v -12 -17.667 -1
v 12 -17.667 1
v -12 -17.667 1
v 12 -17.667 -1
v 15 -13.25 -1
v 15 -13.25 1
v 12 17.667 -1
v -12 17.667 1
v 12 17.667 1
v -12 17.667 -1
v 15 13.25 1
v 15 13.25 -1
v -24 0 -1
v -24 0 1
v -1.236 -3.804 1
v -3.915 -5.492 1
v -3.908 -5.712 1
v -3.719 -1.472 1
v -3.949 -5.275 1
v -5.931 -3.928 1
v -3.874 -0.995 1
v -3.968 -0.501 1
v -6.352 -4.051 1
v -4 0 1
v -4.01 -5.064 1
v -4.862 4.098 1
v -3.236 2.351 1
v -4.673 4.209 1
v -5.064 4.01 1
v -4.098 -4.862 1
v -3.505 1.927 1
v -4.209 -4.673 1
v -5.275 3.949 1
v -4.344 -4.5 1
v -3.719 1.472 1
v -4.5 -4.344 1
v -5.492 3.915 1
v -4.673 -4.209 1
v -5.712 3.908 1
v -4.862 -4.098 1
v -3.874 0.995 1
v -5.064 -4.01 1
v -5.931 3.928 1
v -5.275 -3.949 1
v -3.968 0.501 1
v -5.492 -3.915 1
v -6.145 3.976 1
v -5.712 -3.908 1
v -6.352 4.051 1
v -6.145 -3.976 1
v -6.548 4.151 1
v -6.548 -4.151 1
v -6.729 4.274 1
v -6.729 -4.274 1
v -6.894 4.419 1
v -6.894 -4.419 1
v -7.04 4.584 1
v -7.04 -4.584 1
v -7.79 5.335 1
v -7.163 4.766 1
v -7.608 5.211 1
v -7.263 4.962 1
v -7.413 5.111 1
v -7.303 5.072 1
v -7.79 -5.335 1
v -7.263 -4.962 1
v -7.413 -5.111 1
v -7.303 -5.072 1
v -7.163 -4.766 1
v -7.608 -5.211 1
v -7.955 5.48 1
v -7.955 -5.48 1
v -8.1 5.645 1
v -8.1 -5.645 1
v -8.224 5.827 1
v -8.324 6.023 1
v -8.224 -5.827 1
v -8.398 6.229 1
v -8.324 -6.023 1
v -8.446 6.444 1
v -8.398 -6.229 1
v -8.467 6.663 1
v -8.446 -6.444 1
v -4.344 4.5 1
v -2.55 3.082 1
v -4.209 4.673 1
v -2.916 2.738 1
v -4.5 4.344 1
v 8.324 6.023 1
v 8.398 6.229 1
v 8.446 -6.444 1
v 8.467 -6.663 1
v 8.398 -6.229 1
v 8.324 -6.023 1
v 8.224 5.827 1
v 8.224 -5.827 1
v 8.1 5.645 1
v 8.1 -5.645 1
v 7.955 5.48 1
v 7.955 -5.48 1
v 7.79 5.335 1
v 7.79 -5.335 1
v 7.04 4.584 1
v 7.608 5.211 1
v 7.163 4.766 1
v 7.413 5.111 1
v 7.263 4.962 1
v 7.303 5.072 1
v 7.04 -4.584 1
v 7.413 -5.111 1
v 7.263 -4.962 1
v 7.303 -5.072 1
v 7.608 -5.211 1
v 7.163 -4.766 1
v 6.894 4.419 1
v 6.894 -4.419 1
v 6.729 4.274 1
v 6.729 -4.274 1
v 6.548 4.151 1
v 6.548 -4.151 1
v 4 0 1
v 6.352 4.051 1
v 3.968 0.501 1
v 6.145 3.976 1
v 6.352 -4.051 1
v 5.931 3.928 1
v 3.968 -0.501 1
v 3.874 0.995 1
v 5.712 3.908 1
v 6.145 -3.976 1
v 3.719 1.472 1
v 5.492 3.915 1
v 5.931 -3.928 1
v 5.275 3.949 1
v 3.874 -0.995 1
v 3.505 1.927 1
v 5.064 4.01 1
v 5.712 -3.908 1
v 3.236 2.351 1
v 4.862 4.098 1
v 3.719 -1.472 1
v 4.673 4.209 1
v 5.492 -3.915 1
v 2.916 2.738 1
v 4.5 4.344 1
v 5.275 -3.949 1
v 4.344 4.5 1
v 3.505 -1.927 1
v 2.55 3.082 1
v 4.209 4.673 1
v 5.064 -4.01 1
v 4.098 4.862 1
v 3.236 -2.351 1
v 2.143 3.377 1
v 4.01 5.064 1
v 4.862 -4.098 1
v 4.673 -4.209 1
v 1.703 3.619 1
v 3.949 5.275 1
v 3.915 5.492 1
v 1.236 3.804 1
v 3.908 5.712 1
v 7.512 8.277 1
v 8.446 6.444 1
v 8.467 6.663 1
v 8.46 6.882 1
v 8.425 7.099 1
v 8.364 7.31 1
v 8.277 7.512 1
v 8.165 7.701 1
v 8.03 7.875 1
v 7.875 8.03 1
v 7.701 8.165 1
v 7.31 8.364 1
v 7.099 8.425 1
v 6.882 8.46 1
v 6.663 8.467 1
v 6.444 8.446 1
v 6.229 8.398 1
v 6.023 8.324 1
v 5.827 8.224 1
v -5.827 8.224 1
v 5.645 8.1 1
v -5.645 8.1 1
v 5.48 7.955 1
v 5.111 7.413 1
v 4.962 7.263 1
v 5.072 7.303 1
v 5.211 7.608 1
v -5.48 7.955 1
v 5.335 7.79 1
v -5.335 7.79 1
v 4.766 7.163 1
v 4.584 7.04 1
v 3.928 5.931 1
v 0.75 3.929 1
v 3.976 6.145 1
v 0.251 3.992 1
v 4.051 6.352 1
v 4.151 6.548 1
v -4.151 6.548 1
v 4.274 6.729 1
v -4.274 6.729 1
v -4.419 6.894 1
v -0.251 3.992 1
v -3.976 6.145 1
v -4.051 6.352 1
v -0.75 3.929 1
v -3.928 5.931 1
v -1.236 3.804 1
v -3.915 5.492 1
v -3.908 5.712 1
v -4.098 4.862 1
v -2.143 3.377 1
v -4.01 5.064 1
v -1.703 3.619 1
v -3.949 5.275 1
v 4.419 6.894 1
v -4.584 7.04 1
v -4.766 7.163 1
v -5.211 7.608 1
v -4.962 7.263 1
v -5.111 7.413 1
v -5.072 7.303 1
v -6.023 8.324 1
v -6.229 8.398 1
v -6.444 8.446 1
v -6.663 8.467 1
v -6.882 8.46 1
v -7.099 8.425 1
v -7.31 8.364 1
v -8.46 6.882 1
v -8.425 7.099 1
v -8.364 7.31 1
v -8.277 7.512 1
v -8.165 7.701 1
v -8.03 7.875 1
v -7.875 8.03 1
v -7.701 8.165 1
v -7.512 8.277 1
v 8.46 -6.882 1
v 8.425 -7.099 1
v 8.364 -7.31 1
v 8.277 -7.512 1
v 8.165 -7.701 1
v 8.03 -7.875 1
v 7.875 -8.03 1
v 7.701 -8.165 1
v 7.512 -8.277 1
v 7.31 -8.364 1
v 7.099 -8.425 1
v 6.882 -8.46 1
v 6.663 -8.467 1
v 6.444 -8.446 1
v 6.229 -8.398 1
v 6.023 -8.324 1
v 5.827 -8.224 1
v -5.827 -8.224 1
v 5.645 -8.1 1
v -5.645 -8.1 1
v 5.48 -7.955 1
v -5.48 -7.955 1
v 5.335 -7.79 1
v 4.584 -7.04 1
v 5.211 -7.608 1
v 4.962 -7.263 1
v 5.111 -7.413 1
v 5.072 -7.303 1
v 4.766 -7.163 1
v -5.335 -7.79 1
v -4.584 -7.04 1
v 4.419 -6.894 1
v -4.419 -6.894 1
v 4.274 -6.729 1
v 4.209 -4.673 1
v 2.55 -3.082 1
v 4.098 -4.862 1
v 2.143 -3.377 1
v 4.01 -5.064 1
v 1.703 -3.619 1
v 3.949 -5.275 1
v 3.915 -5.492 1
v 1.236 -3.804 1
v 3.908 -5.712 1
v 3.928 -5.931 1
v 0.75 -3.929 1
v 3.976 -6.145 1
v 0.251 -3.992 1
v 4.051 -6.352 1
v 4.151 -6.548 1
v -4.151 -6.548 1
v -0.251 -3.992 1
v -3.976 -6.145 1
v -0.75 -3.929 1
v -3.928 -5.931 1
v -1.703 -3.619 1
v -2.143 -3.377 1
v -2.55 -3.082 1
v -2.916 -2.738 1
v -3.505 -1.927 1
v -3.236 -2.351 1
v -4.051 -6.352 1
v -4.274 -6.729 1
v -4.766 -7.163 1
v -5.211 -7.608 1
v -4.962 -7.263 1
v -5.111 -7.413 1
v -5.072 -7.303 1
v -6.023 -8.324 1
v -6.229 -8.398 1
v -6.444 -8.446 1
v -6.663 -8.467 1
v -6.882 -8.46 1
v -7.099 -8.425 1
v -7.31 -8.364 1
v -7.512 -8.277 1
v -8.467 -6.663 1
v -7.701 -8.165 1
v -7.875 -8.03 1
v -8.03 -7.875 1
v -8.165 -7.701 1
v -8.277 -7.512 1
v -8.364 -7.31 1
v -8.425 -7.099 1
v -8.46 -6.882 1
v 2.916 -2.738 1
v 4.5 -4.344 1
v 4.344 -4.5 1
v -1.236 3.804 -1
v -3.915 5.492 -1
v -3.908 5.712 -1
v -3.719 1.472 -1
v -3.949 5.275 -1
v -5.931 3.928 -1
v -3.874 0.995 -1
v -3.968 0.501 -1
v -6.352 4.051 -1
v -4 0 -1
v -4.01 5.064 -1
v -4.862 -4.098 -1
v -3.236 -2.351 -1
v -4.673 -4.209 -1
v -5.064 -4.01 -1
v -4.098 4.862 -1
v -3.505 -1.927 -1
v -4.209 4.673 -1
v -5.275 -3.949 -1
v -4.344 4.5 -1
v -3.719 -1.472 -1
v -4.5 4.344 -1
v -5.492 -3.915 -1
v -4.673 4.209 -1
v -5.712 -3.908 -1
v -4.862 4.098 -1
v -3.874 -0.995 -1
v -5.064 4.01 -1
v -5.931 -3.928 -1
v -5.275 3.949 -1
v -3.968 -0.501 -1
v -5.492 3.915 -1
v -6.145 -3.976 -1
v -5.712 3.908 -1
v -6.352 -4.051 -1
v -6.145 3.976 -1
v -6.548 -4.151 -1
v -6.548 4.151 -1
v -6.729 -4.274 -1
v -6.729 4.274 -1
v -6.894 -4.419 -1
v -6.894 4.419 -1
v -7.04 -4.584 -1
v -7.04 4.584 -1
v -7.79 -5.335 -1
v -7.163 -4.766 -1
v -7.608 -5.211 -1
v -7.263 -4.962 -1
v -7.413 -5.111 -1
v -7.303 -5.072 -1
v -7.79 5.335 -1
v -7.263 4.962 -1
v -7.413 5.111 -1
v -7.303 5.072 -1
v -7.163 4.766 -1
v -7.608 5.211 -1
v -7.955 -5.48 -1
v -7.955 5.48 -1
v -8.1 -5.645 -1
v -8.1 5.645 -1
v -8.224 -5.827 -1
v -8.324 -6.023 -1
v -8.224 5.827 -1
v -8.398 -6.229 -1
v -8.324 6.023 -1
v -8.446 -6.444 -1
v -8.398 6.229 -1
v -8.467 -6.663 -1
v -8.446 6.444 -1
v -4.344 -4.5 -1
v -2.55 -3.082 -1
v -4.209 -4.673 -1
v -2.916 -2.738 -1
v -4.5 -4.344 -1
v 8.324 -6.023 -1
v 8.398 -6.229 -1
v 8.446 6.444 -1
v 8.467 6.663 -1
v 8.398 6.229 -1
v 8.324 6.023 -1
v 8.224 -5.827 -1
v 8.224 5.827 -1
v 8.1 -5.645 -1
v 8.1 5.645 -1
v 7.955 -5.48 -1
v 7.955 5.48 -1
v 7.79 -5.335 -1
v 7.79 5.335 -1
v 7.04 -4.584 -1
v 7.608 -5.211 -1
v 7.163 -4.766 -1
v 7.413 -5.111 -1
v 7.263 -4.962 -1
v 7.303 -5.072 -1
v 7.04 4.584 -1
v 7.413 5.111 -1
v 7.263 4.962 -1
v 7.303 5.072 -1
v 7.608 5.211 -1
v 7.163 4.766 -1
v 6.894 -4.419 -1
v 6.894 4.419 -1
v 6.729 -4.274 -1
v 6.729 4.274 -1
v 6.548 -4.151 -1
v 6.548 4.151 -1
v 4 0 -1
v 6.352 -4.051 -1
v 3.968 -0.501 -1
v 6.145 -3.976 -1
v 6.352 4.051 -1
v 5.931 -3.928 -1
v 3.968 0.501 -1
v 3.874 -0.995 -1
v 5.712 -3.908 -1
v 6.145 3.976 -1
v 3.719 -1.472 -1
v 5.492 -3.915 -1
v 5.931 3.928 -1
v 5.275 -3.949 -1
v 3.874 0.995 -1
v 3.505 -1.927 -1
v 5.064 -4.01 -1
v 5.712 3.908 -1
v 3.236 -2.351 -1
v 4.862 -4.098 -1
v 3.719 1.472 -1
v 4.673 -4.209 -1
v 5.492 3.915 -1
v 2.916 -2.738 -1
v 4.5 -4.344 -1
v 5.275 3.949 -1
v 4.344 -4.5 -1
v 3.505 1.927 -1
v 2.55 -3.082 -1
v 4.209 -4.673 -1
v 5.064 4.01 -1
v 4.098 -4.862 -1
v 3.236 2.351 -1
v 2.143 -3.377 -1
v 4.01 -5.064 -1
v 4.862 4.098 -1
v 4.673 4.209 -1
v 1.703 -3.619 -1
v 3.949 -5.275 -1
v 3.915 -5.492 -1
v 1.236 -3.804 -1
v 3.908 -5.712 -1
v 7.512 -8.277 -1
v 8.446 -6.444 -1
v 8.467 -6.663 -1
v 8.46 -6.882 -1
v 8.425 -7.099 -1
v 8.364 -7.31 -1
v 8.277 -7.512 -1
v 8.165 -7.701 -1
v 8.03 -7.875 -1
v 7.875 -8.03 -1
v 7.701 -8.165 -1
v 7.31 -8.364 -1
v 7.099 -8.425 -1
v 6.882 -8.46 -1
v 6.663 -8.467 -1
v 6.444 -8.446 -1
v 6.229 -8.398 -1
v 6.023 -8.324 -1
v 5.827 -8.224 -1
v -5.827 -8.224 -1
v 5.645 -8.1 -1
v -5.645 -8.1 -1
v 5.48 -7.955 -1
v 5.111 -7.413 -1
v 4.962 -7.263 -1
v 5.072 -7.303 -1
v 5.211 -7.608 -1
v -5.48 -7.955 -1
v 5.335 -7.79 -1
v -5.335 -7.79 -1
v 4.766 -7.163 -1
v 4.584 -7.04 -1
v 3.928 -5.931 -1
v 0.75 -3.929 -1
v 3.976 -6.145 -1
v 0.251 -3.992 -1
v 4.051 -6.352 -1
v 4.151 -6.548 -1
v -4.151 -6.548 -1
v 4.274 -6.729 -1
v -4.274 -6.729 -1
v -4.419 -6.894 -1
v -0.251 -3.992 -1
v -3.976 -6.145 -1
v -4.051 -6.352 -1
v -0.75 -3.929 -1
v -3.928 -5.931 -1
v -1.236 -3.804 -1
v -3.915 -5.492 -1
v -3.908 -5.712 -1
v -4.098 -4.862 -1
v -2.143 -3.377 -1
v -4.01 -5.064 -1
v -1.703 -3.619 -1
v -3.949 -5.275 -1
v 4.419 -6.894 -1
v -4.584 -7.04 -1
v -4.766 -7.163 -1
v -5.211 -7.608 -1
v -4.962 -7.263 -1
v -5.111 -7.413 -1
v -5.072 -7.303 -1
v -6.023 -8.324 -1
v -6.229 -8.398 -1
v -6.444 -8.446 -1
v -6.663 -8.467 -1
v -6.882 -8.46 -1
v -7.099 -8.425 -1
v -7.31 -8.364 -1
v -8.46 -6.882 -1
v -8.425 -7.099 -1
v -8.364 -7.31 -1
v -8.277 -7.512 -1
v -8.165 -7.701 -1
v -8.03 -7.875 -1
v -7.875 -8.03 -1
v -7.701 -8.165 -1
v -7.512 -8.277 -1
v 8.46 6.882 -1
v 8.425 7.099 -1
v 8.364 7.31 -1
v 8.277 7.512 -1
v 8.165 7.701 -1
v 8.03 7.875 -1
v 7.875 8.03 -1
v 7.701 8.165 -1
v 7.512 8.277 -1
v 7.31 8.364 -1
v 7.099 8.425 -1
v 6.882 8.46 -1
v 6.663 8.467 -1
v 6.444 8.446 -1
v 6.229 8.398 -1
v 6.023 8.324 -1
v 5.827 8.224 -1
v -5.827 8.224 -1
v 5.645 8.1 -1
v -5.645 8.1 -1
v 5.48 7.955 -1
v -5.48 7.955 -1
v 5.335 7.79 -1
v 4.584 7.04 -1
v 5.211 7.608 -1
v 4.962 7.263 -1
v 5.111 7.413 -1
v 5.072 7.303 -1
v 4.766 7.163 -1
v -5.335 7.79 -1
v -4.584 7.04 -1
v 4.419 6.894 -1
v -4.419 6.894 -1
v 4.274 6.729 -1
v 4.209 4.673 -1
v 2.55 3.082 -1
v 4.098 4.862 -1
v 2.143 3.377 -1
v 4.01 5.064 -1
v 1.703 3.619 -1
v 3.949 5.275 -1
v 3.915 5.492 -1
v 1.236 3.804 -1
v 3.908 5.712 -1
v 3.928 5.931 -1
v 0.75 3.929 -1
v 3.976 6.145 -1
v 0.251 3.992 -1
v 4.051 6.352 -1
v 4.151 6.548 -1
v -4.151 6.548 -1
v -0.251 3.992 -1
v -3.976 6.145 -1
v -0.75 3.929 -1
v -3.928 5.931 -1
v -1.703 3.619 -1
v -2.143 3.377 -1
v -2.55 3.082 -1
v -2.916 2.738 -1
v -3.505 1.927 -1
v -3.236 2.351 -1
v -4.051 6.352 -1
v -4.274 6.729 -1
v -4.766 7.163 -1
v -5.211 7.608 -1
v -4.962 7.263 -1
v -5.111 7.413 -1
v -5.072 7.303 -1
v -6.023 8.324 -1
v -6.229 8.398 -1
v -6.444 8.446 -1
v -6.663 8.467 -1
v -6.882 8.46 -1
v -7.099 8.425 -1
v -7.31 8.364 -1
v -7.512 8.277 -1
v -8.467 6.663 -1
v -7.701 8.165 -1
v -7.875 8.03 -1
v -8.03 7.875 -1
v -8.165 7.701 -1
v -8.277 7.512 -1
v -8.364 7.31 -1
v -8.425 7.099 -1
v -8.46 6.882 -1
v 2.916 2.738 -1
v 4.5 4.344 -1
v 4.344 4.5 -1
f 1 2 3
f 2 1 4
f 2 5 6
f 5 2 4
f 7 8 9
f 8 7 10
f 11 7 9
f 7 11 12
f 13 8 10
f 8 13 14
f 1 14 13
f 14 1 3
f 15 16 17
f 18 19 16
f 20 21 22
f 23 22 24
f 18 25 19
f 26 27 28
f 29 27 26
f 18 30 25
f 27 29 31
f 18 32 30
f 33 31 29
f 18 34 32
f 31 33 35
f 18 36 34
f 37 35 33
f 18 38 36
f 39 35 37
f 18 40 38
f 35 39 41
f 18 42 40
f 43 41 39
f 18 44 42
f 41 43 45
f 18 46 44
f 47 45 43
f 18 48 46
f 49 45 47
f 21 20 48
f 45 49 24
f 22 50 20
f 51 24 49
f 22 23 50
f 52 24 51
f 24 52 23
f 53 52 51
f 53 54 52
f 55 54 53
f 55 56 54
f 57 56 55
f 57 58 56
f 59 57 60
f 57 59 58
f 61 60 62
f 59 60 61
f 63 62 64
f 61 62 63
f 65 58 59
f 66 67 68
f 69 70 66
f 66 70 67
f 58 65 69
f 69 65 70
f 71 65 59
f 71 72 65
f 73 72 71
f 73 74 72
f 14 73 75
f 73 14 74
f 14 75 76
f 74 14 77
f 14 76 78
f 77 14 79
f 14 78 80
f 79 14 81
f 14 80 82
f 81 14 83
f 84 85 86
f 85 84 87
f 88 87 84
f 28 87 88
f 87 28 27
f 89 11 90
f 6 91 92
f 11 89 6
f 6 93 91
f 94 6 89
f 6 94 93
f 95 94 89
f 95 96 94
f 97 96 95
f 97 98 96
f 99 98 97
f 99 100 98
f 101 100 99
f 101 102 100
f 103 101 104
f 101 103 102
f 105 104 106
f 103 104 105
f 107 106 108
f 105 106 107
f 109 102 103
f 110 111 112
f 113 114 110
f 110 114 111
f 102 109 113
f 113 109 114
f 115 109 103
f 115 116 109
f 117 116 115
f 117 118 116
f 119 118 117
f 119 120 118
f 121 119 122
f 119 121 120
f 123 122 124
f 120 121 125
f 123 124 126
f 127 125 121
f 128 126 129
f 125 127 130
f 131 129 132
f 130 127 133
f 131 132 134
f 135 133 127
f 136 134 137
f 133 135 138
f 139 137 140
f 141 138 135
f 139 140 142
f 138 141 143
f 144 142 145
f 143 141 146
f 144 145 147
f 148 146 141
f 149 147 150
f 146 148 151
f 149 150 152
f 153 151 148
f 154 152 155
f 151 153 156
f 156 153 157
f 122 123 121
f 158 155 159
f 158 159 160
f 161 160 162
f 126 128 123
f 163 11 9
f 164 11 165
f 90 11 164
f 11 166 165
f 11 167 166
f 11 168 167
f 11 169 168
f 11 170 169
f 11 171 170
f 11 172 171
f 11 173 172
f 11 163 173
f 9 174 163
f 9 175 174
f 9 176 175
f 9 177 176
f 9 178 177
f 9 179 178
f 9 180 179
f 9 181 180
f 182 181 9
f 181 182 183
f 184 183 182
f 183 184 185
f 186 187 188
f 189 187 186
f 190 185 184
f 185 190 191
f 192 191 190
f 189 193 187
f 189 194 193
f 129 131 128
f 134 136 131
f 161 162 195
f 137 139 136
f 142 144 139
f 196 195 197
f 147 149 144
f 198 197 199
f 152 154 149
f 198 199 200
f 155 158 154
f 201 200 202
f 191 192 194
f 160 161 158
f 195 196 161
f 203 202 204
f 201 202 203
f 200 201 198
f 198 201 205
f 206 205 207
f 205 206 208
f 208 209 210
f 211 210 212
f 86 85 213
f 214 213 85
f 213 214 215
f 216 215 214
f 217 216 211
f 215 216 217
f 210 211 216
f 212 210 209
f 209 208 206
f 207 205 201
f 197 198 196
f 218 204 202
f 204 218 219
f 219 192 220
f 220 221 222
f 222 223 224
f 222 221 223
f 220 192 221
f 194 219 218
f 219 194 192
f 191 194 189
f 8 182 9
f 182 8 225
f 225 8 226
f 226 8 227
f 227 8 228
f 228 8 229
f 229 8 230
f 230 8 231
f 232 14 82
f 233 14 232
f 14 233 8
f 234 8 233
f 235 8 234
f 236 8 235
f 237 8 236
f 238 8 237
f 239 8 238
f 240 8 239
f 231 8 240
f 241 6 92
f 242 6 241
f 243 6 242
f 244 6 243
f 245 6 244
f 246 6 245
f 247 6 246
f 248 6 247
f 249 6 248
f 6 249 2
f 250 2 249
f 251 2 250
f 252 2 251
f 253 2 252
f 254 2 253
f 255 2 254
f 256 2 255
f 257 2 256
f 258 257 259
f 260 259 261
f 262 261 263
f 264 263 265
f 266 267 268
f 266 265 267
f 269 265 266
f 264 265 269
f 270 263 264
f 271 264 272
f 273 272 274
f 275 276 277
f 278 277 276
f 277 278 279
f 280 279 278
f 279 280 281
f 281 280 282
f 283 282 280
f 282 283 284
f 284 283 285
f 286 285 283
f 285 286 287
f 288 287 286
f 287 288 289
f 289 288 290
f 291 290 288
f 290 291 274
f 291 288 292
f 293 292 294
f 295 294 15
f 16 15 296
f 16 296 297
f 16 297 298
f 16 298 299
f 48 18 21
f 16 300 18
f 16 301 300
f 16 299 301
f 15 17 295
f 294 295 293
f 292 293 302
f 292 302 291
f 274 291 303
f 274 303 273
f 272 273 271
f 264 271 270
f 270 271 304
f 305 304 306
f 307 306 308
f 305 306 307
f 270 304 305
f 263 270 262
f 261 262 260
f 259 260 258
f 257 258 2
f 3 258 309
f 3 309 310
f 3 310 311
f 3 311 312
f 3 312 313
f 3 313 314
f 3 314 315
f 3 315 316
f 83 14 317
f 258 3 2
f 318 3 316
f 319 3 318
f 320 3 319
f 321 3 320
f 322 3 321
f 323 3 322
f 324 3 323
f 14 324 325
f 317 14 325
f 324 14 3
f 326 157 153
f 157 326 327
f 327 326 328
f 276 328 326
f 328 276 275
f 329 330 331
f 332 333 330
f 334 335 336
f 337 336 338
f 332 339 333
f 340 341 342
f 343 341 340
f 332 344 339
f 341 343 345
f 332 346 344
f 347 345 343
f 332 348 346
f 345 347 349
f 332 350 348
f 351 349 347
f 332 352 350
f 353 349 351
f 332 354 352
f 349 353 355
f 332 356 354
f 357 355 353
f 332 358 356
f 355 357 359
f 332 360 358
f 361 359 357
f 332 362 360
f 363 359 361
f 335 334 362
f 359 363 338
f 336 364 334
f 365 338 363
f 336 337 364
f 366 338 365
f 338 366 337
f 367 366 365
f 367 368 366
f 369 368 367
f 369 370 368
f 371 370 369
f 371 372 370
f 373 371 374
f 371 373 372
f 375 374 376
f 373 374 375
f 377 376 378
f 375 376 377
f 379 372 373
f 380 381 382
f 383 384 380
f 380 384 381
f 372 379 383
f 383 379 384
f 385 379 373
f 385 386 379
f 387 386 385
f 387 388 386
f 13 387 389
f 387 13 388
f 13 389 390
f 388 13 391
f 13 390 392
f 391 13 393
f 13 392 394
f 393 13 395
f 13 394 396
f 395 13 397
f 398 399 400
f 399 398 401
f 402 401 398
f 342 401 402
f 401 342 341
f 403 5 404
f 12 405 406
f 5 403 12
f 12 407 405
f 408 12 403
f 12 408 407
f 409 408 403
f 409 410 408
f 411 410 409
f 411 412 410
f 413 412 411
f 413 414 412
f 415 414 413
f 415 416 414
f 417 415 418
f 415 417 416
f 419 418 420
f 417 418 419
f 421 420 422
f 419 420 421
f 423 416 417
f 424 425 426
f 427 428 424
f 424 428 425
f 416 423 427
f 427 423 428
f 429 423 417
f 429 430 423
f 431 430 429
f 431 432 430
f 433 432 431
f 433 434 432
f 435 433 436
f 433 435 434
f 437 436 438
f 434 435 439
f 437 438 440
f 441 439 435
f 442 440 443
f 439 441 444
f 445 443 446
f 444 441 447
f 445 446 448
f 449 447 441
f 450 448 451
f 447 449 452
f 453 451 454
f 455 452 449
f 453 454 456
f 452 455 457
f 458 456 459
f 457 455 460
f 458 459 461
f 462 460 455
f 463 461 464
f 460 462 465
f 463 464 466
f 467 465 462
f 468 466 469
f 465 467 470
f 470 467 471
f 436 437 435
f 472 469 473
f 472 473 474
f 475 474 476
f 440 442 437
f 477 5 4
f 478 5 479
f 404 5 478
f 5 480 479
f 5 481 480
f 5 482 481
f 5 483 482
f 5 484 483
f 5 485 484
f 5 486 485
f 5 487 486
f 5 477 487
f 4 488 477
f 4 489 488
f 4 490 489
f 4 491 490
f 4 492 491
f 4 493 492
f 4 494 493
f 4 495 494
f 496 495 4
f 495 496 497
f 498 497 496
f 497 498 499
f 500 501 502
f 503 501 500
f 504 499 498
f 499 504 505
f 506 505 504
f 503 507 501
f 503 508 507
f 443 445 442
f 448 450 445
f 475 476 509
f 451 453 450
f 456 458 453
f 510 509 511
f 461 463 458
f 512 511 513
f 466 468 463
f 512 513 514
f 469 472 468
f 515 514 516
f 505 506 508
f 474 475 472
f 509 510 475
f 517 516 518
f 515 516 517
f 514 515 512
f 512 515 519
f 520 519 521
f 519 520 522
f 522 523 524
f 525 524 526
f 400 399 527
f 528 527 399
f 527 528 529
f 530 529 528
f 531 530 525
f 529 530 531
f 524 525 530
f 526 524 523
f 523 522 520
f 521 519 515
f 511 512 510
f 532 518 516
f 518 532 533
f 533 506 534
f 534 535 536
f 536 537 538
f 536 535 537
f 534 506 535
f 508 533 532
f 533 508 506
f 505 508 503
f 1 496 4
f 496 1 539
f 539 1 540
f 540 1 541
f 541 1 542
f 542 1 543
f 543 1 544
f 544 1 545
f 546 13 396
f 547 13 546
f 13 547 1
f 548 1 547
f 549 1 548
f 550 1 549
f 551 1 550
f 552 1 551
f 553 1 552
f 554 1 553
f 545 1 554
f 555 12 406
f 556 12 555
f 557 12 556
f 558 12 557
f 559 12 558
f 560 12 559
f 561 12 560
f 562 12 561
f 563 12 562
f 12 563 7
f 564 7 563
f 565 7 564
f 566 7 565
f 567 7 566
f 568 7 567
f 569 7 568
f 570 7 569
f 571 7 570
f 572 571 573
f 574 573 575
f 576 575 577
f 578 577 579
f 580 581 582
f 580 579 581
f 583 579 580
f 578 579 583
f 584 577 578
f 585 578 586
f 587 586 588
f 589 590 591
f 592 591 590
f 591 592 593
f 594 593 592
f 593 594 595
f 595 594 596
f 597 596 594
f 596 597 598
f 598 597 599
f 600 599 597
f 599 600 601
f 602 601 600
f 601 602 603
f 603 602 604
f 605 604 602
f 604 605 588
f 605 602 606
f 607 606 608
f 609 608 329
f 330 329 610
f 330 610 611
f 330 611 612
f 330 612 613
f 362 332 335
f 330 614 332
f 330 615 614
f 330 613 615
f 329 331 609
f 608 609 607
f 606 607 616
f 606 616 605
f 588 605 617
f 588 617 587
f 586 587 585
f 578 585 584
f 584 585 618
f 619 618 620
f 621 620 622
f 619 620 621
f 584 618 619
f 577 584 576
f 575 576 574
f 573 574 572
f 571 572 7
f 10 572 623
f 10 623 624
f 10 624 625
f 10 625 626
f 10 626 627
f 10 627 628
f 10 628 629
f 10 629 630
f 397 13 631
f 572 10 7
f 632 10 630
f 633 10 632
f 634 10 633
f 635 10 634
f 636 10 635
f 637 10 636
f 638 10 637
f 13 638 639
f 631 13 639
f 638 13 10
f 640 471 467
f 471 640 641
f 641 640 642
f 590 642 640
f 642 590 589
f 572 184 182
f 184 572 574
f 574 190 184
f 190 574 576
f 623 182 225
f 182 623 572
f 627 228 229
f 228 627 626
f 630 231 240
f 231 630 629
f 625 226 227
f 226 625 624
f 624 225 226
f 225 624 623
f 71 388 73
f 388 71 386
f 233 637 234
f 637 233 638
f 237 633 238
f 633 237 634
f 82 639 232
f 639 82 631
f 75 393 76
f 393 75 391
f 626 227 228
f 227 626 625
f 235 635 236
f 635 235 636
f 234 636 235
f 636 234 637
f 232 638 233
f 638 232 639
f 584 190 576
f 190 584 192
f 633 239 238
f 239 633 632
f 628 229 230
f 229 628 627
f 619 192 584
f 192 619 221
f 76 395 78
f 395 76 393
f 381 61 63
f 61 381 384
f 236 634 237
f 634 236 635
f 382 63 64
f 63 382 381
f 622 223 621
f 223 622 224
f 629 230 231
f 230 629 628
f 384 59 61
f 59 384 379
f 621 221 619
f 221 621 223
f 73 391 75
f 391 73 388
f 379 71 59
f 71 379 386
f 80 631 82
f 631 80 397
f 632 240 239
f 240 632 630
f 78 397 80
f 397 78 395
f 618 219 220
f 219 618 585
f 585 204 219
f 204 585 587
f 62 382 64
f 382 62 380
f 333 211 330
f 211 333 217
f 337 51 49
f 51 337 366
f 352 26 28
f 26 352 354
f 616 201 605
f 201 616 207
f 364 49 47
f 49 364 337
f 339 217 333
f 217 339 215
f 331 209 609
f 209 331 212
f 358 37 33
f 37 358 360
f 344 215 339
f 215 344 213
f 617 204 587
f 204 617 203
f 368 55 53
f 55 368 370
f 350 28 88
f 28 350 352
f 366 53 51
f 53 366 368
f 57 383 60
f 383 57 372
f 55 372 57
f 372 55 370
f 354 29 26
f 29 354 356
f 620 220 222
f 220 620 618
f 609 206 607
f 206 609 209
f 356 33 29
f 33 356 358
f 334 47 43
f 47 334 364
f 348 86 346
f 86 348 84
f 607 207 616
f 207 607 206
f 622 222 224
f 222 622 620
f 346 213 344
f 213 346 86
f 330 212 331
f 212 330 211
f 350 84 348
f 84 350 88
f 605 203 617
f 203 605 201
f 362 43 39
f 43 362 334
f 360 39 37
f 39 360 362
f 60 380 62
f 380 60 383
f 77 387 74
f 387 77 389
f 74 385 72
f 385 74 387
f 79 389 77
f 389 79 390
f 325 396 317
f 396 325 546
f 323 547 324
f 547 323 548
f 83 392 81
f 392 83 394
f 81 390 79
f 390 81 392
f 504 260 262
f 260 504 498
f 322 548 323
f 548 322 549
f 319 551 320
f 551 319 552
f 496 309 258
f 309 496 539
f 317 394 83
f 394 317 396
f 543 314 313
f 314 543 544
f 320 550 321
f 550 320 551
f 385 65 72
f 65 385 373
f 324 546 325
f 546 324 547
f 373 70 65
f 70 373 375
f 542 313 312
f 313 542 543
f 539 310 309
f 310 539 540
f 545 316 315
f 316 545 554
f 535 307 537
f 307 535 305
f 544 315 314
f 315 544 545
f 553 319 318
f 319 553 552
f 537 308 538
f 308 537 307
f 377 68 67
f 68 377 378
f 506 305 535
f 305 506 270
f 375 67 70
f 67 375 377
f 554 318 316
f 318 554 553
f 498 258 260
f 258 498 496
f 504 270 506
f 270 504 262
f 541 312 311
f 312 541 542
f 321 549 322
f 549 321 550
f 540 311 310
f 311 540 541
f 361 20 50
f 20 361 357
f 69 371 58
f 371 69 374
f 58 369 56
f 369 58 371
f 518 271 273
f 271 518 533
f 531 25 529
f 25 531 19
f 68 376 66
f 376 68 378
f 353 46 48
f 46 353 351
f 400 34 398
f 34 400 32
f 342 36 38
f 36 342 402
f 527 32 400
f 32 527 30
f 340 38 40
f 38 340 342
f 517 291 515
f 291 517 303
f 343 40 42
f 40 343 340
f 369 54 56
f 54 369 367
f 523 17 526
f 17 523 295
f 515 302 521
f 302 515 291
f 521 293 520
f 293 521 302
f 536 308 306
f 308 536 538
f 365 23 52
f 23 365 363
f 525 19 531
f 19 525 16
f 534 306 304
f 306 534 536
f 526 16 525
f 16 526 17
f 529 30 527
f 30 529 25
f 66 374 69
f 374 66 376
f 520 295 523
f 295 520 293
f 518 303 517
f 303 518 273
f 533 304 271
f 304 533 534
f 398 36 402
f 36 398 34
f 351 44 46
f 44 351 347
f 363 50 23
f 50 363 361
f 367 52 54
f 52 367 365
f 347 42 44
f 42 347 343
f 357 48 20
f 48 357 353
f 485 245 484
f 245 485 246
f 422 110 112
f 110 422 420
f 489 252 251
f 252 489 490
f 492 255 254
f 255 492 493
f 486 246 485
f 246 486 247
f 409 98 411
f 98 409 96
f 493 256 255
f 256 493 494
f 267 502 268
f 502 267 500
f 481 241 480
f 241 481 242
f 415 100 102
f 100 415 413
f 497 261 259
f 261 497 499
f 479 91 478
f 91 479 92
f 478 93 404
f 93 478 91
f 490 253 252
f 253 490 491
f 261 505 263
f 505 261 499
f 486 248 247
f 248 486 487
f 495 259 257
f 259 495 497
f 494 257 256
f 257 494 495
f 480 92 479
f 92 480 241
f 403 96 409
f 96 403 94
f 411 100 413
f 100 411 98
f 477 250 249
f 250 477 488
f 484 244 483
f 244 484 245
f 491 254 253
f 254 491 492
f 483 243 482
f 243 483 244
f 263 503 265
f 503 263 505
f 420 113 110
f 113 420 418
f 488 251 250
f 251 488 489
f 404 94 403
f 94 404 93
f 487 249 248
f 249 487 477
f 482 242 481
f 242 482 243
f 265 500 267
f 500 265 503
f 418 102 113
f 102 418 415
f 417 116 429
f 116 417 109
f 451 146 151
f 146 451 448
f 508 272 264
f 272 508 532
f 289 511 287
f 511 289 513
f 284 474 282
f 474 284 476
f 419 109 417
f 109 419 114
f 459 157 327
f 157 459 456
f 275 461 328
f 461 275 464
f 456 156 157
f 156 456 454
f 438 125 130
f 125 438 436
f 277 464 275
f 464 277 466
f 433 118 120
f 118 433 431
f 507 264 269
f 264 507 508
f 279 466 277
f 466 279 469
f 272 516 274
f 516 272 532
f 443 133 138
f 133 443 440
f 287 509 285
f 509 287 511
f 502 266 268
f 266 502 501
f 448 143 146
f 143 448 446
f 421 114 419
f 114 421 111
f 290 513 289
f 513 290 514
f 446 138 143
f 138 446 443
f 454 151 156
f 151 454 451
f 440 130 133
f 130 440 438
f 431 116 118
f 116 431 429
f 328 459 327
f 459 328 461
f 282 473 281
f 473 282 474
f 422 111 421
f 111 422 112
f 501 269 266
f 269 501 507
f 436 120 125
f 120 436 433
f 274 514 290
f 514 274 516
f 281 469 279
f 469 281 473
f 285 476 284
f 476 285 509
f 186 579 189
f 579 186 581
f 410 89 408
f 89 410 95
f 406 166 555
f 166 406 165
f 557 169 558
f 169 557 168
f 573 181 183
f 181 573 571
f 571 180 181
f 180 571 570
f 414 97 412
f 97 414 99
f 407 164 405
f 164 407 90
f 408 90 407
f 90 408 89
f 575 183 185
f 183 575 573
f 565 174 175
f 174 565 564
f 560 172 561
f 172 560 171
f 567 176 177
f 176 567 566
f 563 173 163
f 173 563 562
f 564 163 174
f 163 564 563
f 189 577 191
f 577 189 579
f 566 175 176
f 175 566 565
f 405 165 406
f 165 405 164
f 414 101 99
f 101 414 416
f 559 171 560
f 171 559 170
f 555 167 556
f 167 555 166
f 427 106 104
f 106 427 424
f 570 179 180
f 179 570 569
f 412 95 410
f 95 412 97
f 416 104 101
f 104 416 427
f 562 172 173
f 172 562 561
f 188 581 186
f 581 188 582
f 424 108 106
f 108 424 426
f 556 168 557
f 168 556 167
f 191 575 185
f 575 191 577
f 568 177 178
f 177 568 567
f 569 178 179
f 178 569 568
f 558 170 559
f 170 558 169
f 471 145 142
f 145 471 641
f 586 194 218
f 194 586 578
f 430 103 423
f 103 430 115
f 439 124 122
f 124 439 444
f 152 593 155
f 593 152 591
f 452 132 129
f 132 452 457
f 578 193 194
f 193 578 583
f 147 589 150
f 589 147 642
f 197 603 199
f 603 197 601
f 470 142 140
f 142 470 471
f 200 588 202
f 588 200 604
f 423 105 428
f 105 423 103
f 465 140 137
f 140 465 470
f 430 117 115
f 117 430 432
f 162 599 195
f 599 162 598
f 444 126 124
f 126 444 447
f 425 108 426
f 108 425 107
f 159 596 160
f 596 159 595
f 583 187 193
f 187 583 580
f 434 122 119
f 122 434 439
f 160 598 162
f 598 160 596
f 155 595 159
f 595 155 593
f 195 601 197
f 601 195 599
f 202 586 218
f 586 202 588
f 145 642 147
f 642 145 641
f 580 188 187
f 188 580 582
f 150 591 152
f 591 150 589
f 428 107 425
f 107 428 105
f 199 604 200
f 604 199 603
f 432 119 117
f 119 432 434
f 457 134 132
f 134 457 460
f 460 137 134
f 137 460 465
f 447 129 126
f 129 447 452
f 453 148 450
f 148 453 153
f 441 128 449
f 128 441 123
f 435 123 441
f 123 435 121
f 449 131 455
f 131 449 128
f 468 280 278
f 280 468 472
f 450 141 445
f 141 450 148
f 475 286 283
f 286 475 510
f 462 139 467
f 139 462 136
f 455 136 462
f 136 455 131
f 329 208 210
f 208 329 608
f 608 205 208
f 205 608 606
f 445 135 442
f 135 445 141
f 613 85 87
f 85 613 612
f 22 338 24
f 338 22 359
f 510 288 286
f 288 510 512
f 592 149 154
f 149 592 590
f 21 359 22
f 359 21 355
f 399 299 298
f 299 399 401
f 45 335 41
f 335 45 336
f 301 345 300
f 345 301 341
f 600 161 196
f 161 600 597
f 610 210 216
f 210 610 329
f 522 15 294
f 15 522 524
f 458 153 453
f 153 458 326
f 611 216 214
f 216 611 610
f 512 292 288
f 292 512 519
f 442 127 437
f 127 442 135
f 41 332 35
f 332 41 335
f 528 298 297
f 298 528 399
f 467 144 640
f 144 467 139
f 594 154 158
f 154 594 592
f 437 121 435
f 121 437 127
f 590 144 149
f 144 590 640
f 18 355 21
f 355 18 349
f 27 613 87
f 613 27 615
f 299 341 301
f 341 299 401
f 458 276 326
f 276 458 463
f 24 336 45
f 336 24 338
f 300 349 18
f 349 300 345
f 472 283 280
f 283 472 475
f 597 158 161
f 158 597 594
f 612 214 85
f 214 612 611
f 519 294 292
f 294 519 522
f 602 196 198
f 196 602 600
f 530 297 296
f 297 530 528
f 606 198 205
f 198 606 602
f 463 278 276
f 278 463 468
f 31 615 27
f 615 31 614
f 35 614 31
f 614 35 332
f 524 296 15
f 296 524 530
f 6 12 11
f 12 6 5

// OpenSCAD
difference() {
  // outer guard
 scale([1,.85,1]) rotate([0,0,0]) { cylinder(r=24, h=2, $fn=6, center=true); } 
// screw holes
  rotate([0,0,45])  {  translate([0,19/2,0]) {  cylinder(d=3.5, h=3, $fn=50, center=true); } }
  rotate([0,0,45])  {  translate([0,16/2,0]) {  cylinder(d=3.5, h=3, $fn=50, center=true); } }

  rotate([0,0,135]) {  translate([0,19/2,0]) {  cylinder(d=3.5, h=3, $fn=50, center=true); } }
  rotate([0,0,135]) {  translate([0,16/2,0]) {  cylinder(d=3.5, h=3, $fn=50, center=true); } }

  rotate([0,0,225]) {  translate([0,19/2,0]) {  cylinder(d=3.5, h=3, $fn=50, center=true); } }
  rotate([0,0,225]) {  translate([0,16/2,0]) {  cylinder(d=3.5, h=3, $fn=50, center=true); } }

  rotate([0,0,315]) {  translate([0,19/2,0]) {  cylinder(d=3.5, h=3, $fn=50, center=true); } }
  rotate([0,0,315]) {  translate([0,16/2,0]) {  cylinder(d=3.5, h=3, $fn=50, center=true); } }

// oil / inspection hole.
  cylinder(d=8, h=3, $fn=50, center=true); 

translate([25,0,0]) { cube([20,40,3], true); }

}

//color("Red") cube([48,1,3], true);
//color("Blue") cube([1,34,3], true);
